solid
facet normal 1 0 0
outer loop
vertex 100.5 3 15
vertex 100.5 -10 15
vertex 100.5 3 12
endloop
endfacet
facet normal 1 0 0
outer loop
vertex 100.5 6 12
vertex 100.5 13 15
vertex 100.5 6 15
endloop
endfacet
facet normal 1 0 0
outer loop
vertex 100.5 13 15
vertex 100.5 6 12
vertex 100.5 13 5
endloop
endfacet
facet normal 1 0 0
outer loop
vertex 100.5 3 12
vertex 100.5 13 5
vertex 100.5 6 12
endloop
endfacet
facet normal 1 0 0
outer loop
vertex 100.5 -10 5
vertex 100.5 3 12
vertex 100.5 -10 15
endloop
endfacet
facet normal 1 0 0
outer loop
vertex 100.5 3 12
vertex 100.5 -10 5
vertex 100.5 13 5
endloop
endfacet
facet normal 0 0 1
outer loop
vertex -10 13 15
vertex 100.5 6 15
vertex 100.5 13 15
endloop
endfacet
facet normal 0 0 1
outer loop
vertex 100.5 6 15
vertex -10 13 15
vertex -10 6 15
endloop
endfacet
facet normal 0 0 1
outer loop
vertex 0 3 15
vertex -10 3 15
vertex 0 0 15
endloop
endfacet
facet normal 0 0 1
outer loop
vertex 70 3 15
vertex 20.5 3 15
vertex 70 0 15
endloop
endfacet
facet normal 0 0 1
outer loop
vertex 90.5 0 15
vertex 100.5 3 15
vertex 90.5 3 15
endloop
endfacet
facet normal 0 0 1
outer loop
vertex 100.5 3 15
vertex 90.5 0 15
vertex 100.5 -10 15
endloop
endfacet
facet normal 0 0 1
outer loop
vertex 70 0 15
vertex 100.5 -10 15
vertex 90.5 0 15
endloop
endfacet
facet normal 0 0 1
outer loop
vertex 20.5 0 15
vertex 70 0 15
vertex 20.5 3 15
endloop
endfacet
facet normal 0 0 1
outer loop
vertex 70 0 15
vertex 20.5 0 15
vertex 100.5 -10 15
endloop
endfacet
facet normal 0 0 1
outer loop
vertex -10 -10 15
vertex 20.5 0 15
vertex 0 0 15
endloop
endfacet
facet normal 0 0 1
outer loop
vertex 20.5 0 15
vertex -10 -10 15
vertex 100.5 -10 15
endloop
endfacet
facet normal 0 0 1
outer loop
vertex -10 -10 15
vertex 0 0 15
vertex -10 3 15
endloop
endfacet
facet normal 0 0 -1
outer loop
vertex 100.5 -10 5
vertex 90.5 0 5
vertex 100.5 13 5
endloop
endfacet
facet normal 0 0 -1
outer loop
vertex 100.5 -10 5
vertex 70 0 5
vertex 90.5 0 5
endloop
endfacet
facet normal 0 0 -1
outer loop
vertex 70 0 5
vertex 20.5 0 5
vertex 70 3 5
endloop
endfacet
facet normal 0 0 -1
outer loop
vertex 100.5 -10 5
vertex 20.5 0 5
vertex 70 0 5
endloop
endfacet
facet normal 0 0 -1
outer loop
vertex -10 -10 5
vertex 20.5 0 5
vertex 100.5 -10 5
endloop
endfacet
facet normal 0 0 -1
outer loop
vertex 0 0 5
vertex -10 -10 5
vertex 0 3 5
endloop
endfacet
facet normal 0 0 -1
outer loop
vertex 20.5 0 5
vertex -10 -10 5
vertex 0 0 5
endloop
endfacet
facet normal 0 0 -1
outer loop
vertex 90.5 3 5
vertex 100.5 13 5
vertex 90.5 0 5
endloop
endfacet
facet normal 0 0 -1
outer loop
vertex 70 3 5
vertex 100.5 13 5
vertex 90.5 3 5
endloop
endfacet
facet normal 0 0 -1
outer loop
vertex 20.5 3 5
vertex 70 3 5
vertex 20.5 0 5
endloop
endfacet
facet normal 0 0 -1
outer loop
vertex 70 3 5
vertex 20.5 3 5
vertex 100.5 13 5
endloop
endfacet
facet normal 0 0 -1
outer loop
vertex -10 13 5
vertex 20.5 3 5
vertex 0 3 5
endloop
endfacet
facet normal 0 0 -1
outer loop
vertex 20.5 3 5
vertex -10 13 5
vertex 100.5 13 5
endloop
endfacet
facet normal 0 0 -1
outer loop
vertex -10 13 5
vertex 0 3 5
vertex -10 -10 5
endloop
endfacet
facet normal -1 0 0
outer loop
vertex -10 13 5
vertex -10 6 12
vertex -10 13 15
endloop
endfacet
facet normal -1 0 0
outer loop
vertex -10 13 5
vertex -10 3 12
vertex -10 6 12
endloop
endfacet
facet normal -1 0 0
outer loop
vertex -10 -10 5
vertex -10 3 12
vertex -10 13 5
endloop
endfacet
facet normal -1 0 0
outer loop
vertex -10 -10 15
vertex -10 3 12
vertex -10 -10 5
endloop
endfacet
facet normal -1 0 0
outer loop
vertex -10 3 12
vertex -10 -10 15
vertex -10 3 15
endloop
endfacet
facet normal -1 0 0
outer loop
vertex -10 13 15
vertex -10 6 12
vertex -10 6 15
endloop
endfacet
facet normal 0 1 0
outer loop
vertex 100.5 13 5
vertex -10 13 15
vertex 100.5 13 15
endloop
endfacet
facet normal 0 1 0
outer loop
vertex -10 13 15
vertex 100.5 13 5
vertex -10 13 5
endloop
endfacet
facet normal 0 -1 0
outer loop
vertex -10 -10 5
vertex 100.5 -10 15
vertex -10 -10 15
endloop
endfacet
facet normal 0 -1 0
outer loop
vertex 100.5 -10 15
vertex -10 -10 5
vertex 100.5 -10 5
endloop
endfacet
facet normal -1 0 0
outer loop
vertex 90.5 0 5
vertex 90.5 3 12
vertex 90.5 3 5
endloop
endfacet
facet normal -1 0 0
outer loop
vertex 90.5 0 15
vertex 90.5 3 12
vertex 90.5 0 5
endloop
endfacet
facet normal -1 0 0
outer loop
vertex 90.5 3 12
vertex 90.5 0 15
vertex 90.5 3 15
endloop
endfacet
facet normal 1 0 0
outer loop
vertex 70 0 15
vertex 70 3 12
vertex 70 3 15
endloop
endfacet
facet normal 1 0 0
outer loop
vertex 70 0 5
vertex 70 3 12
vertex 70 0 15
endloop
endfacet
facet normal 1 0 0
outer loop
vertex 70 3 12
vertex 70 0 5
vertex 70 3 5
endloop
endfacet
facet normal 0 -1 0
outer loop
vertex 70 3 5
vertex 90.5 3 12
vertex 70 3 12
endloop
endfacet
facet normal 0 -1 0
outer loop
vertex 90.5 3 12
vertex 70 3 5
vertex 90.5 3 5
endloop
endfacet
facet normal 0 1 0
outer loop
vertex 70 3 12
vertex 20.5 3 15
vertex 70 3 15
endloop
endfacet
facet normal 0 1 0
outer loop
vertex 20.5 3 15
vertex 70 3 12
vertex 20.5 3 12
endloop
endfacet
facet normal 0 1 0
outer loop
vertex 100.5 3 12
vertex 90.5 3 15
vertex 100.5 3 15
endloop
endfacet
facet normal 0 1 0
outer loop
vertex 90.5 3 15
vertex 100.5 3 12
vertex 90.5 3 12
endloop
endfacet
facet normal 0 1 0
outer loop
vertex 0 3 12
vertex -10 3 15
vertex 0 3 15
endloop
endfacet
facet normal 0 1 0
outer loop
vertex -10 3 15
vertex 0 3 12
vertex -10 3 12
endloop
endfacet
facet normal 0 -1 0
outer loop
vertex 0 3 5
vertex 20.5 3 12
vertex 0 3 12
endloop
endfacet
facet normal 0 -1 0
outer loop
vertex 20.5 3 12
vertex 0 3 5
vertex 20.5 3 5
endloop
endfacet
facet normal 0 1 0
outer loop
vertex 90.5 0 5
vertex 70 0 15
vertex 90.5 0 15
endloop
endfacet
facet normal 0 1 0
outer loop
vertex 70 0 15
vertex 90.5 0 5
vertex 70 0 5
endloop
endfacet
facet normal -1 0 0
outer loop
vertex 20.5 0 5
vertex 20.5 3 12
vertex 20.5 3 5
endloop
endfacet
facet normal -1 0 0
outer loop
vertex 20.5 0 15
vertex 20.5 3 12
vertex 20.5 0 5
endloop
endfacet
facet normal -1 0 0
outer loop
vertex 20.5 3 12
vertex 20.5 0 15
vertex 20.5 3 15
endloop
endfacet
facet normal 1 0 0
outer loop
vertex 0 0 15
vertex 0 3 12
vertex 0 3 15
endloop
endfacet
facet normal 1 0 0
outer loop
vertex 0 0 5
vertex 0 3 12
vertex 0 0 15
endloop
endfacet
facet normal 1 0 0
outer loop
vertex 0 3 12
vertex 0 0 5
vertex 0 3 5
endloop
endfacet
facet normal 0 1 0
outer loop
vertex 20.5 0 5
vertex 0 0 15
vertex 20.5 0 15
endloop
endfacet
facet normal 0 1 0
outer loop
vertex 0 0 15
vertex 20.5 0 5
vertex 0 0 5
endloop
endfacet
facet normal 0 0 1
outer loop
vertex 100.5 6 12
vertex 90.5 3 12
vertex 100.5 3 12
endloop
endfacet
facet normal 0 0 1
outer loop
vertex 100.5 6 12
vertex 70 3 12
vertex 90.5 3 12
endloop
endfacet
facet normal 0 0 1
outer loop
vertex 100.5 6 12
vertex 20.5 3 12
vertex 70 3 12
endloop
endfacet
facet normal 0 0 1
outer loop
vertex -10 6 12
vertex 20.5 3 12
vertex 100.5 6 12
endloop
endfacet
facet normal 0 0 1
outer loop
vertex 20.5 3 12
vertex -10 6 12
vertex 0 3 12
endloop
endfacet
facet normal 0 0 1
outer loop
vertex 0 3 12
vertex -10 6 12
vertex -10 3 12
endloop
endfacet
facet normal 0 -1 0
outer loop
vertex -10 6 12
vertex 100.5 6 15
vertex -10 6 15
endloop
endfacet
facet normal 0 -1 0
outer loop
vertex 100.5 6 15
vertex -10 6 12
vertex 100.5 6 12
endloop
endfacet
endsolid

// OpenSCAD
padding = 10;

difference(){
translate([-padding,-padding,5])
cube([90.5+padding*2, 3+padding*2, 10]);
    
#
translate([70,0,0])    
cube([20.5, 3, 40]);
cube([20.5, 3, 40]);
    
translate([-50,3,10+5-3])
cube([200, 3, 3]);
}
